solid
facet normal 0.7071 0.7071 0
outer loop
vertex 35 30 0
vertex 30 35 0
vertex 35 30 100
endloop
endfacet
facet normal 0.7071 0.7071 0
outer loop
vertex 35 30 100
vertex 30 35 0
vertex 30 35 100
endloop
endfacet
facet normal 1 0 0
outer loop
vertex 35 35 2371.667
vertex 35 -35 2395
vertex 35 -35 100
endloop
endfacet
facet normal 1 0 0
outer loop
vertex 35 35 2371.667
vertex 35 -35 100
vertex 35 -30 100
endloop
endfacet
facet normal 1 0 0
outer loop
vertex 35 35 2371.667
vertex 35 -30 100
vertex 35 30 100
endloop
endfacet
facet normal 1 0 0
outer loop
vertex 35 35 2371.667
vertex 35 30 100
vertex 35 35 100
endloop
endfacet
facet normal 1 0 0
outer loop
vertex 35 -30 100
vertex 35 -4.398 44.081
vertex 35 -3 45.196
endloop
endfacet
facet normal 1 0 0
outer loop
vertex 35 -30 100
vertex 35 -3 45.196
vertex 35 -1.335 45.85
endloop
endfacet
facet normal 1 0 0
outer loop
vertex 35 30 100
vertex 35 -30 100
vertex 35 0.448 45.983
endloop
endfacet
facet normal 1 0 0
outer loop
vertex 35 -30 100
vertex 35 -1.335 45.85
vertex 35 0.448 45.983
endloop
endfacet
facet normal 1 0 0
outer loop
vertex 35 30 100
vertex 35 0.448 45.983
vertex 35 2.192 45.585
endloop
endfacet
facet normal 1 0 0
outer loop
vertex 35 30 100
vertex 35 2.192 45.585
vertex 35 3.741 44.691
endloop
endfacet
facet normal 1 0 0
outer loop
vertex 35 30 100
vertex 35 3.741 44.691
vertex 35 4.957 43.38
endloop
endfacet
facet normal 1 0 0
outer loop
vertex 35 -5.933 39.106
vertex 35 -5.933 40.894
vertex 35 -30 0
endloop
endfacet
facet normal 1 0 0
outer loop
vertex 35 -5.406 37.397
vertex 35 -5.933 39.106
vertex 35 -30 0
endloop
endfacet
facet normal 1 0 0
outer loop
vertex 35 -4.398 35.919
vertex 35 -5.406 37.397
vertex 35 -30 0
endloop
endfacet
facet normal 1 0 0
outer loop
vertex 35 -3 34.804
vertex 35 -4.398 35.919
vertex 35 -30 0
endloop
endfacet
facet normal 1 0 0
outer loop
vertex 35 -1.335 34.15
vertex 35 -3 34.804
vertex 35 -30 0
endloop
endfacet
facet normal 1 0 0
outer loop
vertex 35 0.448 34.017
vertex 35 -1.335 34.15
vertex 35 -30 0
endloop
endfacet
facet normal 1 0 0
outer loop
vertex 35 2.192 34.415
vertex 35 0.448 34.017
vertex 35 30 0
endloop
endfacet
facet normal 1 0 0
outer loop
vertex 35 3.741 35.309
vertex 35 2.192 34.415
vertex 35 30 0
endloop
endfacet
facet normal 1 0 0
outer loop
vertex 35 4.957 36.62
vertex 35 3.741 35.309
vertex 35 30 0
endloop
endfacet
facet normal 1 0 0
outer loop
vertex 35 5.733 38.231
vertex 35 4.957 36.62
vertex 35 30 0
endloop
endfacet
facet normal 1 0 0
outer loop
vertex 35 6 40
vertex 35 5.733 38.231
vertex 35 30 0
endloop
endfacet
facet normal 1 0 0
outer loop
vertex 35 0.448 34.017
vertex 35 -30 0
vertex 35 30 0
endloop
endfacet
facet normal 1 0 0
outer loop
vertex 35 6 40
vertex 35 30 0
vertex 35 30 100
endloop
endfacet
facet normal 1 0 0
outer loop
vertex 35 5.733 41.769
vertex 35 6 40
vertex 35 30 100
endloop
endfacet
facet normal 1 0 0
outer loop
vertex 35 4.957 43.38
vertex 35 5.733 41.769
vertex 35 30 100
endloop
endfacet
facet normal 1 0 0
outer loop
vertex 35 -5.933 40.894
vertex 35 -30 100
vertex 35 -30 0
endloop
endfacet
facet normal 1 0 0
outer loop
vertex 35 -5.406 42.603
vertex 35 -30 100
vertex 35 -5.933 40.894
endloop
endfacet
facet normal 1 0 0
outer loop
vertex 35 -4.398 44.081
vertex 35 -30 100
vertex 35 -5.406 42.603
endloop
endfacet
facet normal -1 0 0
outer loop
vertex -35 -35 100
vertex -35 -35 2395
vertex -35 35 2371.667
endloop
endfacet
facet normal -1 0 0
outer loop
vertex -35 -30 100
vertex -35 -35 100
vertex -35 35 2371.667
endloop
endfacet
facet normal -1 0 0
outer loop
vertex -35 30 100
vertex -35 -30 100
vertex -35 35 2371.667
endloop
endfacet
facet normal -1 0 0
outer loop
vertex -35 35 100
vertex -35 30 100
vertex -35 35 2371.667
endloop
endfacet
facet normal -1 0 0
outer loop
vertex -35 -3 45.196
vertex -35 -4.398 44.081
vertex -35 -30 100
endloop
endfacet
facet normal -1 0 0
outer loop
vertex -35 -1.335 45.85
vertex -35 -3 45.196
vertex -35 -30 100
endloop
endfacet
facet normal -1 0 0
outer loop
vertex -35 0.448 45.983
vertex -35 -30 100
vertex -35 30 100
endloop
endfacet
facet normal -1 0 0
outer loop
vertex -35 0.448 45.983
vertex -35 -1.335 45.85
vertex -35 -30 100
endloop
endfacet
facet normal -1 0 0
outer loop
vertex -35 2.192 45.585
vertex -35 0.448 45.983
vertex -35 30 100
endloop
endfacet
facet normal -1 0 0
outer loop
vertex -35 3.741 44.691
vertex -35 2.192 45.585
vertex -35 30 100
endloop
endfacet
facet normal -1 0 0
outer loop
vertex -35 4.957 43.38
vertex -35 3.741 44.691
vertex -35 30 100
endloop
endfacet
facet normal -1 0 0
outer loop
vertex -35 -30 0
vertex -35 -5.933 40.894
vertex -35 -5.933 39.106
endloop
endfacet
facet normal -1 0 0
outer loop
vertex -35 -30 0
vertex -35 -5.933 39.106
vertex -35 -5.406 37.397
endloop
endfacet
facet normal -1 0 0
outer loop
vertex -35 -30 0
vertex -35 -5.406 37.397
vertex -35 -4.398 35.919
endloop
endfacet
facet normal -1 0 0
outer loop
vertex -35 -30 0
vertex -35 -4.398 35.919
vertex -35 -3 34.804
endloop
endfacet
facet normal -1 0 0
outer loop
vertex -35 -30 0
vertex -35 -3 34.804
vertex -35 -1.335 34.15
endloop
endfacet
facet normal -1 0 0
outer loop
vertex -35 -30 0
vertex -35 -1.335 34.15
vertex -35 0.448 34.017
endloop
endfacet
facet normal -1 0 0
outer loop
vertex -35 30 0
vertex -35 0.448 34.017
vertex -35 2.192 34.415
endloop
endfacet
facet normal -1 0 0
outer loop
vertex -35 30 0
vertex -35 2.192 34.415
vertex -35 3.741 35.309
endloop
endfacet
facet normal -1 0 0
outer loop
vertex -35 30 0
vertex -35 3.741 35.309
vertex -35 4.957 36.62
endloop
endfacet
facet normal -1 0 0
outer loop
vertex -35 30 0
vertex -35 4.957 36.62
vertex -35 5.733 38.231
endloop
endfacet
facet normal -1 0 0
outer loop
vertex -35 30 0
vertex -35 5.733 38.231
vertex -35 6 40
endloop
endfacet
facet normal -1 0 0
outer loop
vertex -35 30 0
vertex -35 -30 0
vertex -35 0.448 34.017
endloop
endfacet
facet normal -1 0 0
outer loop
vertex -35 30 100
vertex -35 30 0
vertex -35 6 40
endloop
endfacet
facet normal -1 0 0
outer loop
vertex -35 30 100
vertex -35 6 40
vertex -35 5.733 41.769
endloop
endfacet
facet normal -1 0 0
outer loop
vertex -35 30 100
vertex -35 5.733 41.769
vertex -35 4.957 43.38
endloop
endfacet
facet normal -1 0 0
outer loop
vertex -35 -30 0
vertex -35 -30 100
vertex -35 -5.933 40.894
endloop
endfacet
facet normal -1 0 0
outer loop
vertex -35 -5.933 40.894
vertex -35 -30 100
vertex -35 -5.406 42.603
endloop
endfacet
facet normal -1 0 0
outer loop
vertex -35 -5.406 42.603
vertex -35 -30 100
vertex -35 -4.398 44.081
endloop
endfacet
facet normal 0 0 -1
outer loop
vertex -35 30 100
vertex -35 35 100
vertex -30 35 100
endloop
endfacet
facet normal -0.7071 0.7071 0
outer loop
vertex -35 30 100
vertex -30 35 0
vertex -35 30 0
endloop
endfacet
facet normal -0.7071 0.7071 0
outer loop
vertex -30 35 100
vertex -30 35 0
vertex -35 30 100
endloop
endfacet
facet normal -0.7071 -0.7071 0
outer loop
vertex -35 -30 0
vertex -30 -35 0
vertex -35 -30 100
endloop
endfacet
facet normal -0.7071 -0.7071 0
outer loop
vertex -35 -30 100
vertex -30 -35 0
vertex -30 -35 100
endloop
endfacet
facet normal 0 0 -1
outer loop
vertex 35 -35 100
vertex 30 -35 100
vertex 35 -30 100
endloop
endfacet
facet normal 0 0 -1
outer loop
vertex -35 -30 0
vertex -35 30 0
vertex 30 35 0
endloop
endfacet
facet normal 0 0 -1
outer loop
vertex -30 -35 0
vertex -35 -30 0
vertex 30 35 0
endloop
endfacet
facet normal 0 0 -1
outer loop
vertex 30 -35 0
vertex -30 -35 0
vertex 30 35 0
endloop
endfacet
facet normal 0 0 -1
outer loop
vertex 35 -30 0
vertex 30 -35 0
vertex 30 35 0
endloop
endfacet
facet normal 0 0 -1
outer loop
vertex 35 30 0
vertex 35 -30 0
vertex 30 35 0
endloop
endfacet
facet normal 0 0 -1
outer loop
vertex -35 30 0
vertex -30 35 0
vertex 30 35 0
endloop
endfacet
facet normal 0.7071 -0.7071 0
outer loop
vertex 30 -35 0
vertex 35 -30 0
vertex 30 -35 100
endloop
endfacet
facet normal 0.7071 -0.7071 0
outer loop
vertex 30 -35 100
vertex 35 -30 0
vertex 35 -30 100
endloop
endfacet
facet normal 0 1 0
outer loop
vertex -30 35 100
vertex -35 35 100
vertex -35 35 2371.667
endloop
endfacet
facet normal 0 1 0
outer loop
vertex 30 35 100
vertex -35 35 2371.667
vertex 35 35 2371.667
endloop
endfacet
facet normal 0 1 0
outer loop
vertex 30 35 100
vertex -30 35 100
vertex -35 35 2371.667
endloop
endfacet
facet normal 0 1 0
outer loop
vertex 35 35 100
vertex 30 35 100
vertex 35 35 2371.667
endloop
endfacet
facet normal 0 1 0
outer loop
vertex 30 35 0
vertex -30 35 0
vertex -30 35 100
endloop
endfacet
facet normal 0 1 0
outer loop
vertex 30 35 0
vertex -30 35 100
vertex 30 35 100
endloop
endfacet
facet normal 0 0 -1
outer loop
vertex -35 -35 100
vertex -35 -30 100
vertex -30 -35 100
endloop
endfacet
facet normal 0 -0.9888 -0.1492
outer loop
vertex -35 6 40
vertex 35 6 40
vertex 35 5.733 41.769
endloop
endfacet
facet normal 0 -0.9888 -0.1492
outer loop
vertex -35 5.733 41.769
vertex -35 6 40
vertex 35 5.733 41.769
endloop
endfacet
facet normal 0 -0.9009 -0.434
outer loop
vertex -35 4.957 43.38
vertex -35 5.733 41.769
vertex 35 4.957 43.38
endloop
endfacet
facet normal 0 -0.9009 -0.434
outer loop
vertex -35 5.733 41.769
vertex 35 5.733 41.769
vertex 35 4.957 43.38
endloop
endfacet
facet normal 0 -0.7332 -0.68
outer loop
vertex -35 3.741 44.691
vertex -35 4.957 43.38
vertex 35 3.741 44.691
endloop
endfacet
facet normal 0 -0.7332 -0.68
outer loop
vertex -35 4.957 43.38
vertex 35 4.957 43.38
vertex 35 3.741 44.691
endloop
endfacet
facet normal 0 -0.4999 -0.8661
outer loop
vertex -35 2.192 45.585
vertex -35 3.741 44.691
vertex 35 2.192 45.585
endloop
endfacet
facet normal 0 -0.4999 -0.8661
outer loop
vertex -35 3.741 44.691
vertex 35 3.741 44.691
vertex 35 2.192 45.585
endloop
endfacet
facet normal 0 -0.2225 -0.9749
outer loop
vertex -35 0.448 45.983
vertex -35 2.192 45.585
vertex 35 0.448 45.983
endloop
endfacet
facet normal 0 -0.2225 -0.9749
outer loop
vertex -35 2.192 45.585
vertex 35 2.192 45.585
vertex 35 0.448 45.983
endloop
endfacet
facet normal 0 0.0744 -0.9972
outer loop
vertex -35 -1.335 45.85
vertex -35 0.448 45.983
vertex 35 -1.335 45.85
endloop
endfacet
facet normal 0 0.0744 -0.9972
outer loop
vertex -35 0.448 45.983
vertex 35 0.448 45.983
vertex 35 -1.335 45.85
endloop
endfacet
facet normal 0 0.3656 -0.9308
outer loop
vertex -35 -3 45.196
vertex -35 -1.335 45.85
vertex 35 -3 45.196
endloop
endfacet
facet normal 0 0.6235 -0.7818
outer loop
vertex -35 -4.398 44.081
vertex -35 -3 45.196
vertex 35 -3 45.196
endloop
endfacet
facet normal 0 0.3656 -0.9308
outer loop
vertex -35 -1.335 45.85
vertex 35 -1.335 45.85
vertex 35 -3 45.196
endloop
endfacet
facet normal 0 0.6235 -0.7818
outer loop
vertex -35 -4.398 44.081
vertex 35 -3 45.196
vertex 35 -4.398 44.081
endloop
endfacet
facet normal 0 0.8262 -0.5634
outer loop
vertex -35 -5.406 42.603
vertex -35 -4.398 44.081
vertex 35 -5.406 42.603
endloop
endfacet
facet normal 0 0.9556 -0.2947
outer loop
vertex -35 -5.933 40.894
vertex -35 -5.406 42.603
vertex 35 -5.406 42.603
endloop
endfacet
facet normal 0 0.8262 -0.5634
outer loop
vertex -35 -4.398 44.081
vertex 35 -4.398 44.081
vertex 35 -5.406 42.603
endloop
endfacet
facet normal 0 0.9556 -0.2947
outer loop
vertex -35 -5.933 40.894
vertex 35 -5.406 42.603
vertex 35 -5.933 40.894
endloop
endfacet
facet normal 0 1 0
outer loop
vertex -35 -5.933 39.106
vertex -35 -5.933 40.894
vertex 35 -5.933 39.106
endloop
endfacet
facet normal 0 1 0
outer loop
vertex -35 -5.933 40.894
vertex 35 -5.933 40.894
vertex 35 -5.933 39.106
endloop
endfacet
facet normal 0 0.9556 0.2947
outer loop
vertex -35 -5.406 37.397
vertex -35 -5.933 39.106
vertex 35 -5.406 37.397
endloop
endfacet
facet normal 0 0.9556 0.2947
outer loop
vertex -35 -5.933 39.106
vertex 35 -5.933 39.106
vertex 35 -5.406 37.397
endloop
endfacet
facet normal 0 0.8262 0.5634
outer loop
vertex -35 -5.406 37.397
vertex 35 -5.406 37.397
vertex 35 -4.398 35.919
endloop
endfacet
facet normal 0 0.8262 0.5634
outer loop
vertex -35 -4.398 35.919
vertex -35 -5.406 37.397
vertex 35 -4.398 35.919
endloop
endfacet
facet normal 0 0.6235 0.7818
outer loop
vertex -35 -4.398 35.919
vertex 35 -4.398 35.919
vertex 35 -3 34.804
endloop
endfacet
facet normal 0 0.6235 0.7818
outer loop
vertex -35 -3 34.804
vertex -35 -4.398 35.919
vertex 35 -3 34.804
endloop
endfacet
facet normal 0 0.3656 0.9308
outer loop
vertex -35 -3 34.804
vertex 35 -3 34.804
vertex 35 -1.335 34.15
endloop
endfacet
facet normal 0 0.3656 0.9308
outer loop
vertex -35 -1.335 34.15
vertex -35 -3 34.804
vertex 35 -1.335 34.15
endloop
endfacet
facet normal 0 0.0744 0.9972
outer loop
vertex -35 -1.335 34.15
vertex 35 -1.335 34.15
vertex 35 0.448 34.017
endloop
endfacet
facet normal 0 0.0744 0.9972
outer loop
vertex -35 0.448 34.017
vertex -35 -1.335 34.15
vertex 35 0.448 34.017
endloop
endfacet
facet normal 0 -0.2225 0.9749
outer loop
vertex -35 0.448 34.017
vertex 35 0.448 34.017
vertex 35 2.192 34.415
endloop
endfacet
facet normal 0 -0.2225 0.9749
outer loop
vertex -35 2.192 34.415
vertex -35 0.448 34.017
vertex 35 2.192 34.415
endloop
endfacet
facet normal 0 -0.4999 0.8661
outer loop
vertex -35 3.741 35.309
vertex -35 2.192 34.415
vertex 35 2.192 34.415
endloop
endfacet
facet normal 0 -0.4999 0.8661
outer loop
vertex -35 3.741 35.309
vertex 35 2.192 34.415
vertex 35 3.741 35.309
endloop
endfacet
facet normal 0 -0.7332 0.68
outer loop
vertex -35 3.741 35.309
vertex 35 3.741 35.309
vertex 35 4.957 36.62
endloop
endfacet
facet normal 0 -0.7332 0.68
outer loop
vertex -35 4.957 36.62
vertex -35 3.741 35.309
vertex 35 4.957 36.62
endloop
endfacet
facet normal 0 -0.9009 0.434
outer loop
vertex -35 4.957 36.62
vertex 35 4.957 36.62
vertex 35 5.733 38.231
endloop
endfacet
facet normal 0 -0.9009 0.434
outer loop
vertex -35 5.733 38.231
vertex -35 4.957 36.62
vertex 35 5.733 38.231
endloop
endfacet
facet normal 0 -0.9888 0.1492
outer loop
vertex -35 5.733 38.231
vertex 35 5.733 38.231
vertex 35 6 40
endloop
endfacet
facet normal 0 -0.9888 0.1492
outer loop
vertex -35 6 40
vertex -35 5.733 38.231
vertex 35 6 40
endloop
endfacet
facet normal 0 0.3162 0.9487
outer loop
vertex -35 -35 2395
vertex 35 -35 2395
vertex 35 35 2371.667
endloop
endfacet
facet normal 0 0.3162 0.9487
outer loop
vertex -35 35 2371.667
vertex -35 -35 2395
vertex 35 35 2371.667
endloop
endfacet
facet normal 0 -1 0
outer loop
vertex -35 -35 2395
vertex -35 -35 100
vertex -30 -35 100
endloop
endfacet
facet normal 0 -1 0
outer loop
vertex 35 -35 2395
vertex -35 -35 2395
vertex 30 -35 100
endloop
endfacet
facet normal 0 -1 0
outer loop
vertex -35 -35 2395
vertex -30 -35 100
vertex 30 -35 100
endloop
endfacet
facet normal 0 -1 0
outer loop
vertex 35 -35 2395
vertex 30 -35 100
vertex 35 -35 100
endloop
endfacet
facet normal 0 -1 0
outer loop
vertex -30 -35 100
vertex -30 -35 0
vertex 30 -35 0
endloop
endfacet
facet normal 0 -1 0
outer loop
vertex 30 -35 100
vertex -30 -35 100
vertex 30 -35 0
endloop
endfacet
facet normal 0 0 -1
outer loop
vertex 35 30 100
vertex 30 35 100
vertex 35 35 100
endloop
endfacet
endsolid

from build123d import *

# Parameters (mm, degrees)
F0_W     = 70
F0_H     = 70
F1_DEPTH = 100
F2_SIZE  = 5
F3_W     = 70
F3_H     = 70
F4_DEPTH = 2295
F5_R     = 6
F6_DEPTH = 70.001


with BuildPart() as f1:
    # F0 (on Top) → F1 (new body)
    with BuildSketch(Plane.XY):
        Rectangle(F0_W, F0_H)
    extrude(amount=F1_DEPTH)

    # F2
    f2_edges = [f1.edges().sort_by_distance(p)[0] for p in [
        (-35, -35, 50),
        (35, -35, 50),
        (35, 35, 50),
        (-35, 35, 50),
    ]]
    chamfer(f2_edges, length=F2_SIZE)

    # F3 (on face) → F4 (join)
    with BuildSketch(Plane.XY.offset(100)):
        Rectangle(F3_W, F3_H)
    extrude(amount=F4_DEPTH)

    # F5 (on face) → F6 (cut, through all)
    with BuildSketch(Plane.YZ.offset(35)):
        with Locations((0, 40)):
            Circle(F5_R)
        Polygon((35, 2395), (-35, 2395), (35, 2371.666667), align=None)
    extrude(amount=-F6_DEPTH, mode=Mode.SUBTRACT)


solid = f1.part
